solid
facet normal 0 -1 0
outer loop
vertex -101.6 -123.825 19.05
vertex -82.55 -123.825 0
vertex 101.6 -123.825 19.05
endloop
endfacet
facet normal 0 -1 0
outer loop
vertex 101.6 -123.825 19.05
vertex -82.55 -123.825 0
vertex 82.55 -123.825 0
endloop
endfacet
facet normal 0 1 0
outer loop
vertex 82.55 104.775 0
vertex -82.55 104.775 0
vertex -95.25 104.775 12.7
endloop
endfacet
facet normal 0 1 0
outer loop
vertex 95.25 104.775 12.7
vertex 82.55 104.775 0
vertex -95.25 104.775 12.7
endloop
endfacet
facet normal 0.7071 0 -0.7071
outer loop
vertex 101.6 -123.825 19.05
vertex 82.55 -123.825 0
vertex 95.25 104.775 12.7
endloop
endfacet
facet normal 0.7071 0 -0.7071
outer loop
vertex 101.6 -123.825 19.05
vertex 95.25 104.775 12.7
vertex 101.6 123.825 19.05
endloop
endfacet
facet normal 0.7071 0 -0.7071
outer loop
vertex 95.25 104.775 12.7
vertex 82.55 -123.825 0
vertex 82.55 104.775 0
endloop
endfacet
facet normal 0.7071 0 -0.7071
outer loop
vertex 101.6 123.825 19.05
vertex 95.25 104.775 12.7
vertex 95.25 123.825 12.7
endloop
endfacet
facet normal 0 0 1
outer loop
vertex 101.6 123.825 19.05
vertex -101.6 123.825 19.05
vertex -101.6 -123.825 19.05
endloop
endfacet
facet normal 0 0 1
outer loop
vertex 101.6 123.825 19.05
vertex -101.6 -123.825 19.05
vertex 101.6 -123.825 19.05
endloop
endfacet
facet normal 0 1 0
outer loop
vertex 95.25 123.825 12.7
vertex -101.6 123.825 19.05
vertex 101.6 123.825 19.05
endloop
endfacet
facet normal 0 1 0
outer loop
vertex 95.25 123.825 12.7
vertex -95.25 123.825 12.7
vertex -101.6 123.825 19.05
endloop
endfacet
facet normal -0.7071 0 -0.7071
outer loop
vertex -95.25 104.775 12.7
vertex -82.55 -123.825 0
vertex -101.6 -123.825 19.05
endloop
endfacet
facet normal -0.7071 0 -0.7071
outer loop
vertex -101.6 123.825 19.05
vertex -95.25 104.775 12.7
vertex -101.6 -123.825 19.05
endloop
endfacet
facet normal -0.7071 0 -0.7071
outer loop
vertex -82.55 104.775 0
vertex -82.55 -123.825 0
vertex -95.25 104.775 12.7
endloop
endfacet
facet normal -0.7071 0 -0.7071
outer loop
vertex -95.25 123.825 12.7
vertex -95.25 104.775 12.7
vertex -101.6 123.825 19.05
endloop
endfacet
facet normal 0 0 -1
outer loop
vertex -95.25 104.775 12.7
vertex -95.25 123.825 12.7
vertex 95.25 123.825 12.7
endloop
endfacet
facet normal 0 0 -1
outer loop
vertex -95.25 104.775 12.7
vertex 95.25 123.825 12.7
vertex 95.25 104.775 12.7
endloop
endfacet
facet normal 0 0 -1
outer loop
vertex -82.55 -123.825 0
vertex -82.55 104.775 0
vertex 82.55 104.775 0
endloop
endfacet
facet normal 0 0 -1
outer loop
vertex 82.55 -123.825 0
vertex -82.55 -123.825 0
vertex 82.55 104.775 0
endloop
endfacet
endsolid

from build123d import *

# Parameters (mm, degrees)
F0_W     = 203.2
F0_H     = 247.65
F1_DEPTH = 19.05
F2_W     = 19.05
F2_H     = 12.7
F3_DEPTH = 203.201
F4_SIZE  = 19.04999
F5_SIZE  = 19.04999


# Not quite as in the source:
# - a fillet or chamfer is up to 0.001 mm smaller than in the source, because OpenCascade refuses the exact size


with BuildPart() as f1:
    # F0 (on Top) → F1 (new body)
    with BuildSketch(Plane.XY):
        Rectangle(F0_W, F0_H)
    extrude(amount=F1_DEPTH)

    # F2 (on face) → F3 (cut, through all)
    with BuildSketch(Plane(origin=(-101.6, 0, 0), x_dir=(0, -1, 0), z_dir=(-1, 0, 0))):
        with Locations((-114.3, 6.35)):
            Rectangle(F2_W, F2_H)
    extrude(amount=-F3_DEPTH, mode=Mode.SUBTRACT)

    # F4 (size 19.05 in the source; OpenCascade refuses exactly that, so slightly less here)
    f4_edges = [f1.edges().sort_by_distance(p)[0] for p in [
        (-101.6, -9.525, 0),
    ]]
    chamfer(f4_edges, length=F4_SIZE)

    # F5 (size 19.05 in the source; OpenCascade refuses exactly that, so slightly less here)
    f5_edges = [f1.edges().sort_by_distance(p)[0] for p in [
        (101.6, -9.525, 0),
    ]]
    chamfer(f5_edges, length=F5_SIZE)


solid = f1.part
